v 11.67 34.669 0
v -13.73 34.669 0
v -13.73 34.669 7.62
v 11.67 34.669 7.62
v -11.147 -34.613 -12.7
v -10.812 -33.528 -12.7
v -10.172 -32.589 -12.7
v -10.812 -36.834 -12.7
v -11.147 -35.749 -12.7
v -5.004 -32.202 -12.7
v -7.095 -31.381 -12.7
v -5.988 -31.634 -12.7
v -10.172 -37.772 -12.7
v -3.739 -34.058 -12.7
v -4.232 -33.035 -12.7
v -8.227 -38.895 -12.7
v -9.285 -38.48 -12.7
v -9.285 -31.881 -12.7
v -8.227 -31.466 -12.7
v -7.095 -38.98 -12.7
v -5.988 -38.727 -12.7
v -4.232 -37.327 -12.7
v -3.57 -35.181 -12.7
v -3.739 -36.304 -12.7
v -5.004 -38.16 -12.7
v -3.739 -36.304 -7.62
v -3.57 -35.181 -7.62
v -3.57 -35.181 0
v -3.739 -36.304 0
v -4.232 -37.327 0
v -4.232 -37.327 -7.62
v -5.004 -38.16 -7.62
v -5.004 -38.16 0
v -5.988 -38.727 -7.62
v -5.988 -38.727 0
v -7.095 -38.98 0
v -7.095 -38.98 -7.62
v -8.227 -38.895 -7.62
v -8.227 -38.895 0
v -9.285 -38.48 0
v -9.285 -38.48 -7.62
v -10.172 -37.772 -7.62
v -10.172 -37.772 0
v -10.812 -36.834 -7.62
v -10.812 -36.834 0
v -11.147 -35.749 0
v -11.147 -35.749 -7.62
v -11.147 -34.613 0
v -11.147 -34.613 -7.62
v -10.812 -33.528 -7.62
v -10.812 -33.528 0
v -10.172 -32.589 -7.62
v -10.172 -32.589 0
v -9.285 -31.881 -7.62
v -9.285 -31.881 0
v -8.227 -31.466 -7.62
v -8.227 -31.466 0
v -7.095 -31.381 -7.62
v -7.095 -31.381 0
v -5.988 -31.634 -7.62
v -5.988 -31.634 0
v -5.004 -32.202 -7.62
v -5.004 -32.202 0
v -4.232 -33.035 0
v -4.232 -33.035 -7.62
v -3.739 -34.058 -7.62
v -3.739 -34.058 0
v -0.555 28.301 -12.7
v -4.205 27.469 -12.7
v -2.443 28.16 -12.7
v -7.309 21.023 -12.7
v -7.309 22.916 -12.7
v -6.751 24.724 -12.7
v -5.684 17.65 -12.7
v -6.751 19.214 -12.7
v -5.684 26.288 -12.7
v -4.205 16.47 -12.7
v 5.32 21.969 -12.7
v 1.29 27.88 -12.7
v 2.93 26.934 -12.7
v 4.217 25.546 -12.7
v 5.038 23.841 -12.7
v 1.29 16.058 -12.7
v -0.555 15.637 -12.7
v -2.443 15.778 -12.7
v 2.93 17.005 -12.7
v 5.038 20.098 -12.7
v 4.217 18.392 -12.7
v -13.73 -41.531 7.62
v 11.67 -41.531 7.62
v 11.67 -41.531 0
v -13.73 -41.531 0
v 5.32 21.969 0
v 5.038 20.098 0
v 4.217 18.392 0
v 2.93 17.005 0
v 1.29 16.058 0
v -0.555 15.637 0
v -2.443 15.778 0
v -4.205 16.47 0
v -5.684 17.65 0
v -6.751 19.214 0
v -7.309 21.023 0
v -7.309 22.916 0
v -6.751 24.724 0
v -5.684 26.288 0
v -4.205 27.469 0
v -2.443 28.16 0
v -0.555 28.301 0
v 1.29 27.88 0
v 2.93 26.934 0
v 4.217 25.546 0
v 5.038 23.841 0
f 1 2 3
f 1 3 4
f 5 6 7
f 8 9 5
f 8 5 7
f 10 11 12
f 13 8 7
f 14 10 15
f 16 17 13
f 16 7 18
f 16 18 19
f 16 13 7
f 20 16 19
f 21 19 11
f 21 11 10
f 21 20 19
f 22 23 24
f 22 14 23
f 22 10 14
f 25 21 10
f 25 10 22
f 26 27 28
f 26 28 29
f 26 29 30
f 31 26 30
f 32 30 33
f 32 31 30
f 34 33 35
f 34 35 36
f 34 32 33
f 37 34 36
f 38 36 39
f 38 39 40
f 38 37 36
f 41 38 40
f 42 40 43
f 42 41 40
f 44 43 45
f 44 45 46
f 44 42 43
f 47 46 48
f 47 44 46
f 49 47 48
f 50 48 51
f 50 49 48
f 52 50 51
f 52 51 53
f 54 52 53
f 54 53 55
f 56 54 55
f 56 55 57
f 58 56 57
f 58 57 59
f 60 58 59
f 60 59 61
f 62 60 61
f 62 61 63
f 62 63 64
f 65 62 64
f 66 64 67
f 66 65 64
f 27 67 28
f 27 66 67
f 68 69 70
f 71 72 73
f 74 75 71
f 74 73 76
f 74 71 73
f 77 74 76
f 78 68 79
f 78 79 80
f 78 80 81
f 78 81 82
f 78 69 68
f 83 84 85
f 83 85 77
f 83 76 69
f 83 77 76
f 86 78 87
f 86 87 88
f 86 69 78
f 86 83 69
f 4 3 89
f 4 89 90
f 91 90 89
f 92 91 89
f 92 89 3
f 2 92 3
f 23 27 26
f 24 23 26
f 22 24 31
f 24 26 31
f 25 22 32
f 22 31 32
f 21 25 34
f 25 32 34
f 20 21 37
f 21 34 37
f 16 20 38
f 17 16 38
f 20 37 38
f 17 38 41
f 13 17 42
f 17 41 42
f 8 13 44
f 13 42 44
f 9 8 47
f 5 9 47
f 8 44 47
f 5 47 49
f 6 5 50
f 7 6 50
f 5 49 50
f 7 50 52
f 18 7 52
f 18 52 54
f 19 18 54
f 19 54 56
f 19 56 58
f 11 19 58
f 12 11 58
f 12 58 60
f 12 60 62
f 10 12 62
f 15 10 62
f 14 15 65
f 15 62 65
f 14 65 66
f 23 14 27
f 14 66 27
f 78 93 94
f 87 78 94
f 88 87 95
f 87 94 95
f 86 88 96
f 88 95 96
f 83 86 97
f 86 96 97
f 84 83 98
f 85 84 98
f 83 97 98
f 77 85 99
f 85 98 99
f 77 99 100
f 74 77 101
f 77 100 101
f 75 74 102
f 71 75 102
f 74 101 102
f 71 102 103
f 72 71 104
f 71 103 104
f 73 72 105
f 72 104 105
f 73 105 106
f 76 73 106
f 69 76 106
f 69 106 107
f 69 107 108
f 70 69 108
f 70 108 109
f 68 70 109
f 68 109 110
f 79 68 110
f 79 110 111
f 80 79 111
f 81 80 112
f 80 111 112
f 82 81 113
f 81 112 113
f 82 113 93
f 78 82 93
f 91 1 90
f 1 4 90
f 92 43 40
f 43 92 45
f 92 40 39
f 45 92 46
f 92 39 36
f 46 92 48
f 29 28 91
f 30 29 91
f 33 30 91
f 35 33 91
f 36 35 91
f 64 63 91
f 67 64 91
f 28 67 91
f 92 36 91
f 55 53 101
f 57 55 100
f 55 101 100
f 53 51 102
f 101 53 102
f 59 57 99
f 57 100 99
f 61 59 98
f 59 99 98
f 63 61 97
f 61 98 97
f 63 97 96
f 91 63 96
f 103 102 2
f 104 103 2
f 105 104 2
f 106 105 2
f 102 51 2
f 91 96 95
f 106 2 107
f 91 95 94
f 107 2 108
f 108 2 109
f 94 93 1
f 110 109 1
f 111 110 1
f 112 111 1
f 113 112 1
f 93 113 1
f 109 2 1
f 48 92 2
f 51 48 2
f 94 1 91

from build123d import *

# Parameters (mm, degrees)
F0_W     = 25.4
F0_H     = 76.2
F1_DEPTH = 7.62
F2_R     = 6.35
F3_DEPTH = 12.7
F5_DEPTH = 7.62
F6_R     = 3.81
F7_DEPTH = 7.62
F8_DEPTH = 5.08


with BuildPart() as f1:
    # F0 (on Top) → F1 (new body)
    with BuildSketch(Plane.XY):
        with Locations((-1.029531109, -3.4307520837)):
            Rectangle(F0_W, F0_H)
    extrude(amount=F1_DEPTH)

    # F2 (on face) → F3 (join)
    with BuildSketch(Plane(origin=(0, 0, 0), x_dir=(1, 0, 0), z_dir=(0, 0, -1))):
        with Locations((-1.029531109, -21.9692479163)):
            Circle(F2_R)
    extrude(amount=F3_DEPTH)

    # F4 (on face) → F5 (join)
    with BuildSketch(Plane(origin=(0, 0, 0), x_dir=(1, 0, 0), z_dir=(0, 0, -1))):
        with BuildLine():
            ThreePointArc((-13.729531109, -21.9692479163), (-13.6507066419, -20.5564746978), (-13.4152117126, -19.1612386598))
            add(Edge.make_bspline(
                [(-13.4152117126, -19.1612386598), (-12.8610433574, -14.3104636642), (-11.5717530157, -4.180075995), (-8.9574552779, 13.7376117238), (-1.3781278255, 26.6796034372), (5.8301842944, 35.8071219352), (11.670468891, 38.2592551099)],
                knots=[0.0402552104, 0.0402552104, 0.0402552104, 0.0402552104, 0.2518393979, 0.5131919232, 0.7477210565, 1, 1, 1, 1], degree=3))
            Line((11.670468891, 38.2592551099), (11.670468891, 41.5307520837))
            Line((11.670468891, 41.5307520837), (-13.729531109, 41.5307520837))
            Line((-13.729531109, 41.5307520837), (-13.729531109, -21.9692479163))
        make_face()
    extrude(amount=F5_DEPTH)

    # F6 (on face) → F7 (cut)
    with BuildSketch(Plane(origin=(0, 0, -7.62), x_dir=(1, 0, 0), z_dir=(0, 0, -1))):
        with BuildLine():
            Line((-13.729531109, 41.5307520837), (-13.729531109, -21.9692479163))
            ThreePointArc((-13.729531109, -21.9692479163), (-13.6507066419, -20.5564746978), (-13.4152117126, -19.1612386598))
            add(Edge.make_bspline(
                [(-13.4152117126, -19.1612386598), (-12.8610433574, -14.3104636642), (-11.5717530157, -4.180075995), (-8.9574552779, 13.7376117238), (-1.3781278255, 26.6796034372), (5.8301842944, 35.8071219352), (11.670468891, 38.2592551099)],
                knots=[0.0402552104, 0.0402552104, 0.0402552104, 0.0402552104, 0.2518393979, 0.5131919232, 0.7477210565, 1, 1, 1, 1], degree=3))
            Line((11.670468891, 38.2592551099), (11.670468891, 41.5307520837))
            Line((11.670468891, 41.5307520837), (-13.729531109, 41.5307520837))
        make_face()
        with Locations((-7.379531109, 35.1807520837)):
            Circle(F6_R, mode=Mode.SUBTRACT)
    extrude(amount=-F7_DEPTH, mode=Mode.SUBTRACT)

    # F8 (add): a face of the model
    f8_faces = [f1.faces().sort_by_distance(p)[0] for p in [
        (-7.379531109, -35.1807520837, -7.62),
    ]]
    extrude(f8_faces, amount=F8_DEPTH)


solid = f1.part
